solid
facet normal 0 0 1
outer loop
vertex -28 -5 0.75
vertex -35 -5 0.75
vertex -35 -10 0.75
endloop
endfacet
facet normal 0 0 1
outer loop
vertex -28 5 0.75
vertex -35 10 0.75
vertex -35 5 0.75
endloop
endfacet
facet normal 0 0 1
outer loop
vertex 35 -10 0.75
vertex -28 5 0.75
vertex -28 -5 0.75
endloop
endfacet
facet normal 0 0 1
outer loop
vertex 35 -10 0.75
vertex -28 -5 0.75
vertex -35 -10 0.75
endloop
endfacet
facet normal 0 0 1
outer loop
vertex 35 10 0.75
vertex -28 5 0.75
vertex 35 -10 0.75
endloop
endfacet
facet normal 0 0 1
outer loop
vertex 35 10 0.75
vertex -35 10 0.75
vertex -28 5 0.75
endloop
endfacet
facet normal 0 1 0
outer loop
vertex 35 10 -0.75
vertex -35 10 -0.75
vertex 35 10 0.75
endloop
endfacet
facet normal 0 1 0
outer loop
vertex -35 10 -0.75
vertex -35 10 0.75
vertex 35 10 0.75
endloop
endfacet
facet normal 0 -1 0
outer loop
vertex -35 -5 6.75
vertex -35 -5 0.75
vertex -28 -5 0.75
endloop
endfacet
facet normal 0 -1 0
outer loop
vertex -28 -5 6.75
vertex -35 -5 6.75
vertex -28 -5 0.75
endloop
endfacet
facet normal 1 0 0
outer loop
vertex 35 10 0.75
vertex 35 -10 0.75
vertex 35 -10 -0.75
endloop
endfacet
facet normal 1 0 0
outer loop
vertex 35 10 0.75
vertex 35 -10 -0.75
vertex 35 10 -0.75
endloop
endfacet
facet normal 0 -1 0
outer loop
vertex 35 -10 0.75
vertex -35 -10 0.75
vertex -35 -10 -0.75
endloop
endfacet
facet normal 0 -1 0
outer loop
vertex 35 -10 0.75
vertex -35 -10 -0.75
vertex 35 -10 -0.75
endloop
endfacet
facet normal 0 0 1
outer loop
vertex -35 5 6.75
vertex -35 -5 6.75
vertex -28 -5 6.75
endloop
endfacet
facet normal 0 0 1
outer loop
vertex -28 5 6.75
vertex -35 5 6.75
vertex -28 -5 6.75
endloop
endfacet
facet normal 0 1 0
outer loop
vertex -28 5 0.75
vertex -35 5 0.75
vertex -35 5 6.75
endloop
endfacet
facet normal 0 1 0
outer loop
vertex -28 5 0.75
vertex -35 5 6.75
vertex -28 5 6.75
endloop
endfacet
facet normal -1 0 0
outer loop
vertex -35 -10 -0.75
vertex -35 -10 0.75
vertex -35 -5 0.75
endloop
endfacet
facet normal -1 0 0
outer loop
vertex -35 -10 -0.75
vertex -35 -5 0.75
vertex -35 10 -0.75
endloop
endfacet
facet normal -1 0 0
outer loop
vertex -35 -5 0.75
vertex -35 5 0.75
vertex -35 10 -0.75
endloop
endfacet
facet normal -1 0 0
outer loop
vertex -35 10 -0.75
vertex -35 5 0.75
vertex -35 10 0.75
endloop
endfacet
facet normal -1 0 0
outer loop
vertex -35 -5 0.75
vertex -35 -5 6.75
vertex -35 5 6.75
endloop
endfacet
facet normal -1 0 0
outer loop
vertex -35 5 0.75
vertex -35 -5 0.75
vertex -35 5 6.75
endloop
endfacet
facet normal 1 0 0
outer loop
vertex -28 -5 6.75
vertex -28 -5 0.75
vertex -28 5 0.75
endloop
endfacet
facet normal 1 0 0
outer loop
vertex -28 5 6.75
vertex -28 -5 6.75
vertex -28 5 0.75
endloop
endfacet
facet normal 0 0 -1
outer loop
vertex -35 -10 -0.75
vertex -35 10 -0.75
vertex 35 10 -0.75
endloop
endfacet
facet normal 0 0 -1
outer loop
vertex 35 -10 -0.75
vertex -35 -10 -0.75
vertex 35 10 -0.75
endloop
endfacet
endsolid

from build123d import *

# Parameters (mm, degrees)
SKETCH1_W           = 70
SKETCH1_H           = 20
BOSS_EXTRUDE1_DEPTH = 0.75
SKETCH2_W           = 7
SKETCH2_H           = 10
BOSS_EXTRUDE2_DEPTH = 6


with BuildPart() as part:
    # Sketch1 → Boss-Extrude1 (new, symmetric)
    with BuildSketch(Plane.XY):
        Rectangle(SKETCH1_W, SKETCH1_H)
    extrude(amount=BOSS_EXTRUDE1_DEPTH, both=True)

    # Sketch2 → Boss-Extrude2 (add)
    with BuildSketch(Plane.XY.offset(0.75)):
        with Locations((-31.5, 0)):
            Rectangle(SKETCH2_W, SKETCH2_H)
    extrude(amount=BOSS_EXTRUDE2_DEPTH)


solid = part.part
